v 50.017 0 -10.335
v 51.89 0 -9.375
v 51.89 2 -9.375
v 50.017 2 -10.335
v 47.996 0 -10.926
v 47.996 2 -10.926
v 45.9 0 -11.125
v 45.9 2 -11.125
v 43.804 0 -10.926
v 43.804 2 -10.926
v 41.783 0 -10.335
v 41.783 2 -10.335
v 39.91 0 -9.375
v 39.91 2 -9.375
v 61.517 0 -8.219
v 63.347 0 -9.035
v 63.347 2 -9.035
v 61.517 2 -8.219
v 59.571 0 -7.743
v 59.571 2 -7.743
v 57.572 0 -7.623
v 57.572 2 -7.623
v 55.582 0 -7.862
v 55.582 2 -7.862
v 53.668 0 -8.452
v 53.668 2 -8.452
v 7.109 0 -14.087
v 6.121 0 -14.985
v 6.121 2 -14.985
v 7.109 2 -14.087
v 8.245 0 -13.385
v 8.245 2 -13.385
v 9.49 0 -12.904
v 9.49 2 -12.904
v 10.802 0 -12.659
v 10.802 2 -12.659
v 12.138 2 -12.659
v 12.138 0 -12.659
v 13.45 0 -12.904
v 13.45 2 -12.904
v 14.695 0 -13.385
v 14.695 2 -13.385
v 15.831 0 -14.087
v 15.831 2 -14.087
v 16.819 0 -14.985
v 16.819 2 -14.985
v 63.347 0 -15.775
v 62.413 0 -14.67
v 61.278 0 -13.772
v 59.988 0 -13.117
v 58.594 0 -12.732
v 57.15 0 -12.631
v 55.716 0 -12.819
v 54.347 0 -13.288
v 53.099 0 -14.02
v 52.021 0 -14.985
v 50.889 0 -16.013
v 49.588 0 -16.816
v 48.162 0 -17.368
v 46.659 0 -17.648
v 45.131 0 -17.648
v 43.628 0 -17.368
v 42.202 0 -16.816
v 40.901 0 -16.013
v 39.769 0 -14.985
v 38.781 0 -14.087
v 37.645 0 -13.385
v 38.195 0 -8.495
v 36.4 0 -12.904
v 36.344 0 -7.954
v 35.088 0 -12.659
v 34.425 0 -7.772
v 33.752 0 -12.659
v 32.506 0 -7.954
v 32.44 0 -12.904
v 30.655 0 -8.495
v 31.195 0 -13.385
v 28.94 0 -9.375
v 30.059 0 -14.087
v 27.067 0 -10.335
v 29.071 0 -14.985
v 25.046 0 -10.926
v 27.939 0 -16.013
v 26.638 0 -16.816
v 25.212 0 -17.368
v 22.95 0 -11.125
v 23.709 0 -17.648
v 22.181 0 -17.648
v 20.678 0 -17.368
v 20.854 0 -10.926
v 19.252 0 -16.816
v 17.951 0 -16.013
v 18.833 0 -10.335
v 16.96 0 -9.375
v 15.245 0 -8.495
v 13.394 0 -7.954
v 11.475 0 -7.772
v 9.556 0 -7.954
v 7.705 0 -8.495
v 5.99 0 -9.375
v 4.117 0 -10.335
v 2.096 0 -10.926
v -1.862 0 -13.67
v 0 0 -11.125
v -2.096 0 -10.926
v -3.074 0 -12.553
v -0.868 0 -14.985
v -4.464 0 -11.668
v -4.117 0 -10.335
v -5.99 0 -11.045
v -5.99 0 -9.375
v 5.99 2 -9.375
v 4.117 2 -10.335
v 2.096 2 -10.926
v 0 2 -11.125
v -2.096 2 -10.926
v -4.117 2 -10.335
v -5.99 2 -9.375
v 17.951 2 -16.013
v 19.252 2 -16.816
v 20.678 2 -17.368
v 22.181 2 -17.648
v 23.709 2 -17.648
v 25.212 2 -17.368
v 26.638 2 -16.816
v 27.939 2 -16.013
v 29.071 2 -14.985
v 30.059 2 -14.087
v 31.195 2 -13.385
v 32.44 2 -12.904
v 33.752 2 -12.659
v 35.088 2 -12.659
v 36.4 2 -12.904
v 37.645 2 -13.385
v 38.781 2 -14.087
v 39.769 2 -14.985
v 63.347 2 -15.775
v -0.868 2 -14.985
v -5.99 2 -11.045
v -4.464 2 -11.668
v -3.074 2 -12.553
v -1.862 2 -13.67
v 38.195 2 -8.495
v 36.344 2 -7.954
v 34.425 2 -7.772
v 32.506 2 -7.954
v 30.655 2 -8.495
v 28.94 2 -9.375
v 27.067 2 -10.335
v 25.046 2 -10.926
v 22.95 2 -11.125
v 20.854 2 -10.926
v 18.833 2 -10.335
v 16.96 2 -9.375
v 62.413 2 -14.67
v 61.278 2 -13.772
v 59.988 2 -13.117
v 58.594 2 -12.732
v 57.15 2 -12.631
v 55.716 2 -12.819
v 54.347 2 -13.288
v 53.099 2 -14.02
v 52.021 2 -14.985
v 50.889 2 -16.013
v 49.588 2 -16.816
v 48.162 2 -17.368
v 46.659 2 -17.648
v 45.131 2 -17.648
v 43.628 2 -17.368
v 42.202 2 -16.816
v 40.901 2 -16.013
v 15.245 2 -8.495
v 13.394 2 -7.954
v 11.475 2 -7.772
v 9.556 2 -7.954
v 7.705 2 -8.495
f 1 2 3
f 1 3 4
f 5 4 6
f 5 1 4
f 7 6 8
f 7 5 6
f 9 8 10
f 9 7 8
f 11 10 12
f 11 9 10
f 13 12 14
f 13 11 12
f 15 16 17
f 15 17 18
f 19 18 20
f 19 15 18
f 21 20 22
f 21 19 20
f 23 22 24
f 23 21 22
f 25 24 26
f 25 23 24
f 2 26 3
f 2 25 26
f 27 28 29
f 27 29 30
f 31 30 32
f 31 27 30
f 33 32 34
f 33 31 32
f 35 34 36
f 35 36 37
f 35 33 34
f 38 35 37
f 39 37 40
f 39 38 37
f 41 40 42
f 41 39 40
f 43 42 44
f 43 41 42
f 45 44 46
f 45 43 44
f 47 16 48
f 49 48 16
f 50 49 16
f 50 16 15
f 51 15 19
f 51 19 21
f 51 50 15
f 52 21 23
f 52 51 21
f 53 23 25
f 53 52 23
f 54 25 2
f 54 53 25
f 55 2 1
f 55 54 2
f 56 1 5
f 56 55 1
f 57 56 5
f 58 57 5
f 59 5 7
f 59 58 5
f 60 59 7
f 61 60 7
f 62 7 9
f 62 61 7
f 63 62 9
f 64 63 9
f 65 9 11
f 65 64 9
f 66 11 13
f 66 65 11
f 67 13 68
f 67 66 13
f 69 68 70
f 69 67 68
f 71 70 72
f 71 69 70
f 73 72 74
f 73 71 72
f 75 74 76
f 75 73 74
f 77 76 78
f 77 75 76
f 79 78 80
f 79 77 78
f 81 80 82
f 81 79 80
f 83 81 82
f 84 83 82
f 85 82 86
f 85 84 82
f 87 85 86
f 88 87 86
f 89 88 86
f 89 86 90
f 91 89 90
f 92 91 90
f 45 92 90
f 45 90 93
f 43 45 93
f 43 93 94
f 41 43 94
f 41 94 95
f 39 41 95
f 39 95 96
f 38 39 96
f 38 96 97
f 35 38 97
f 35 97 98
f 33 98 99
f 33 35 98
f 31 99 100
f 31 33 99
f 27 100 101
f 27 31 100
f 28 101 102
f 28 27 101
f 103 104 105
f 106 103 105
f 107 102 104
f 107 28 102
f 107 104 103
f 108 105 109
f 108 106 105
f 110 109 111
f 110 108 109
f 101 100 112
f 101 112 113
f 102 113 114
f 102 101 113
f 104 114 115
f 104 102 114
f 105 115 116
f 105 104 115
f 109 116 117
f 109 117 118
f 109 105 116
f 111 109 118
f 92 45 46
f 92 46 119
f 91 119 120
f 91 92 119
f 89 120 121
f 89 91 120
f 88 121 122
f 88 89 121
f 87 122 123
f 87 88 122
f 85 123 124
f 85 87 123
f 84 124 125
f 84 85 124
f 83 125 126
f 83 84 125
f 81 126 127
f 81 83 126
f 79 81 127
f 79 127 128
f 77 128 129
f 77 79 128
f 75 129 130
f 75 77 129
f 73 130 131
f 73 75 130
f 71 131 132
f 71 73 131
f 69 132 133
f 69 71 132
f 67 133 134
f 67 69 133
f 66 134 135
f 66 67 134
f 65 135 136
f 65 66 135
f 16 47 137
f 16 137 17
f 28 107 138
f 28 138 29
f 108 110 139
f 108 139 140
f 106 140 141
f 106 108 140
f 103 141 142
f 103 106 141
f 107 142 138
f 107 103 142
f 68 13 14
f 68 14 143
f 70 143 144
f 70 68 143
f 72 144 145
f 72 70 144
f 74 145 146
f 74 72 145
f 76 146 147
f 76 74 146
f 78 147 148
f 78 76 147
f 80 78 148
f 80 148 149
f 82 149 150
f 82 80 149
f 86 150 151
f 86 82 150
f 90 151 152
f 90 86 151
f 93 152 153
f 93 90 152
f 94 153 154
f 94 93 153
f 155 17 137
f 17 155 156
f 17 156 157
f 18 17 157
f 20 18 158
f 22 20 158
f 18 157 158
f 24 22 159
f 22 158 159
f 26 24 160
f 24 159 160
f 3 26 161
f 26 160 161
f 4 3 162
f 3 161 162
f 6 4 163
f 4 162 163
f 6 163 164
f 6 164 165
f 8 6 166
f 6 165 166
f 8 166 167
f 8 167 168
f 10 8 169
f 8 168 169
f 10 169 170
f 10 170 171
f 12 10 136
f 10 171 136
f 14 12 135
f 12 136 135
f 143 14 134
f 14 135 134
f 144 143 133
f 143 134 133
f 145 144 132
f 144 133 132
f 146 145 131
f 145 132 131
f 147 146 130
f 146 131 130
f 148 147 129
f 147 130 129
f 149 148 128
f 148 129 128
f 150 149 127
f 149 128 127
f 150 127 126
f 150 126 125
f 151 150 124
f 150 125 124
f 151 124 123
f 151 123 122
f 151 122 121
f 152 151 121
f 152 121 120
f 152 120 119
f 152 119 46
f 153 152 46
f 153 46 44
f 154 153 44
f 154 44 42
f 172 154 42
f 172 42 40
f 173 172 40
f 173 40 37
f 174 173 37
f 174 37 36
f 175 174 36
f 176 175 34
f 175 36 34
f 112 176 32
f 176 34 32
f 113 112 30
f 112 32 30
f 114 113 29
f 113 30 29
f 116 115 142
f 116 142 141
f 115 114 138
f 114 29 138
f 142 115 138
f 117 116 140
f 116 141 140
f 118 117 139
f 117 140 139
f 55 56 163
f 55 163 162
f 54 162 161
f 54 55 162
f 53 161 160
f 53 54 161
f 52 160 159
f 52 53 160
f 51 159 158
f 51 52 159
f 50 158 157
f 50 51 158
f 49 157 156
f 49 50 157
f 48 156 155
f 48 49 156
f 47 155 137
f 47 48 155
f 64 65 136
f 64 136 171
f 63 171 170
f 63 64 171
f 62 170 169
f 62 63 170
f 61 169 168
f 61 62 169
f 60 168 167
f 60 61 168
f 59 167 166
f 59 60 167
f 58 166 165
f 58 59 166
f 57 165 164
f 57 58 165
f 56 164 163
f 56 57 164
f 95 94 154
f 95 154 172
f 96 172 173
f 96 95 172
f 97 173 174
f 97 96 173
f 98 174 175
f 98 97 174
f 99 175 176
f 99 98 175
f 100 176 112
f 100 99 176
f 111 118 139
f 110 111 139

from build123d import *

# Parameters (mm, degrees)
BOSS_EXTRUDE1_DEPTH = 2


with BuildPart() as part:
    # Sketch2 → Boss-Extrude1 (new body)
    with BuildSketch(Plane(origin=(0, 0, 0), x_dir=(1, 0, 0), z_dir=(0, 1, 0))):
        with BuildLine():
            Line((63.346978543, 15.774727996), (63.346978543, 9.034727996))
            ThreePointArc((63.346978543, 9.034727996), (57.571540875, 7.622708087), (51.89, 9.374727996))
            ThreePointArc((51.89, 9.374727996), (45.9, 11.125), (39.91, 9.374727996))
            ThreePointArc((39.91, 9.374727996), (34.425, 7.772016487), (28.94, 9.374727996))
            ThreePointArc((28.94, 9.374727996), (22.95, 11.125), (16.96, 9.374727996))
            ThreePointArc((16.96, 9.374727996), (11.475, 7.772016487), (5.99, 9.374727996))
            ThreePointArc((5.99, 9.374727996), (0, 11.125), (-5.99, 9.374727996))
            Line((-5.99, 9.374727996), (-5.99, 11.044727996))
            ThreePointArc((-5.99, 11.044727996), (-3.073533572, 12.552842644), (-0.867605229, 14.984727996))
            Line((-0.867605229, 14.984727996), (6.120538735, 14.984727996))
            ThreePointArc((6.120538735, 14.984727996), (11.47, 12.62816893), (16.819461265, 14.984727996))
            ThreePointArc((16.819461265, 14.984727996), (22.945, 17.683166797), (29.070538735, 14.984727996))
            ThreePointArc((29.070538735, 14.984727996), (34.42, 12.62816893), (39.769461265, 14.984727996))
            ThreePointArc((39.769461265, 14.984727996), (45.895, 17.683166797), (52.020538735, 14.984727996))
            ThreePointArc((52.020538735, 14.984727996), (57.874449684, 12.645739842), (63.346978543, 15.774727996))
        make_face()
    extrude(amount=BOSS_EXTRUDE1_DEPTH)


solid = part.part
